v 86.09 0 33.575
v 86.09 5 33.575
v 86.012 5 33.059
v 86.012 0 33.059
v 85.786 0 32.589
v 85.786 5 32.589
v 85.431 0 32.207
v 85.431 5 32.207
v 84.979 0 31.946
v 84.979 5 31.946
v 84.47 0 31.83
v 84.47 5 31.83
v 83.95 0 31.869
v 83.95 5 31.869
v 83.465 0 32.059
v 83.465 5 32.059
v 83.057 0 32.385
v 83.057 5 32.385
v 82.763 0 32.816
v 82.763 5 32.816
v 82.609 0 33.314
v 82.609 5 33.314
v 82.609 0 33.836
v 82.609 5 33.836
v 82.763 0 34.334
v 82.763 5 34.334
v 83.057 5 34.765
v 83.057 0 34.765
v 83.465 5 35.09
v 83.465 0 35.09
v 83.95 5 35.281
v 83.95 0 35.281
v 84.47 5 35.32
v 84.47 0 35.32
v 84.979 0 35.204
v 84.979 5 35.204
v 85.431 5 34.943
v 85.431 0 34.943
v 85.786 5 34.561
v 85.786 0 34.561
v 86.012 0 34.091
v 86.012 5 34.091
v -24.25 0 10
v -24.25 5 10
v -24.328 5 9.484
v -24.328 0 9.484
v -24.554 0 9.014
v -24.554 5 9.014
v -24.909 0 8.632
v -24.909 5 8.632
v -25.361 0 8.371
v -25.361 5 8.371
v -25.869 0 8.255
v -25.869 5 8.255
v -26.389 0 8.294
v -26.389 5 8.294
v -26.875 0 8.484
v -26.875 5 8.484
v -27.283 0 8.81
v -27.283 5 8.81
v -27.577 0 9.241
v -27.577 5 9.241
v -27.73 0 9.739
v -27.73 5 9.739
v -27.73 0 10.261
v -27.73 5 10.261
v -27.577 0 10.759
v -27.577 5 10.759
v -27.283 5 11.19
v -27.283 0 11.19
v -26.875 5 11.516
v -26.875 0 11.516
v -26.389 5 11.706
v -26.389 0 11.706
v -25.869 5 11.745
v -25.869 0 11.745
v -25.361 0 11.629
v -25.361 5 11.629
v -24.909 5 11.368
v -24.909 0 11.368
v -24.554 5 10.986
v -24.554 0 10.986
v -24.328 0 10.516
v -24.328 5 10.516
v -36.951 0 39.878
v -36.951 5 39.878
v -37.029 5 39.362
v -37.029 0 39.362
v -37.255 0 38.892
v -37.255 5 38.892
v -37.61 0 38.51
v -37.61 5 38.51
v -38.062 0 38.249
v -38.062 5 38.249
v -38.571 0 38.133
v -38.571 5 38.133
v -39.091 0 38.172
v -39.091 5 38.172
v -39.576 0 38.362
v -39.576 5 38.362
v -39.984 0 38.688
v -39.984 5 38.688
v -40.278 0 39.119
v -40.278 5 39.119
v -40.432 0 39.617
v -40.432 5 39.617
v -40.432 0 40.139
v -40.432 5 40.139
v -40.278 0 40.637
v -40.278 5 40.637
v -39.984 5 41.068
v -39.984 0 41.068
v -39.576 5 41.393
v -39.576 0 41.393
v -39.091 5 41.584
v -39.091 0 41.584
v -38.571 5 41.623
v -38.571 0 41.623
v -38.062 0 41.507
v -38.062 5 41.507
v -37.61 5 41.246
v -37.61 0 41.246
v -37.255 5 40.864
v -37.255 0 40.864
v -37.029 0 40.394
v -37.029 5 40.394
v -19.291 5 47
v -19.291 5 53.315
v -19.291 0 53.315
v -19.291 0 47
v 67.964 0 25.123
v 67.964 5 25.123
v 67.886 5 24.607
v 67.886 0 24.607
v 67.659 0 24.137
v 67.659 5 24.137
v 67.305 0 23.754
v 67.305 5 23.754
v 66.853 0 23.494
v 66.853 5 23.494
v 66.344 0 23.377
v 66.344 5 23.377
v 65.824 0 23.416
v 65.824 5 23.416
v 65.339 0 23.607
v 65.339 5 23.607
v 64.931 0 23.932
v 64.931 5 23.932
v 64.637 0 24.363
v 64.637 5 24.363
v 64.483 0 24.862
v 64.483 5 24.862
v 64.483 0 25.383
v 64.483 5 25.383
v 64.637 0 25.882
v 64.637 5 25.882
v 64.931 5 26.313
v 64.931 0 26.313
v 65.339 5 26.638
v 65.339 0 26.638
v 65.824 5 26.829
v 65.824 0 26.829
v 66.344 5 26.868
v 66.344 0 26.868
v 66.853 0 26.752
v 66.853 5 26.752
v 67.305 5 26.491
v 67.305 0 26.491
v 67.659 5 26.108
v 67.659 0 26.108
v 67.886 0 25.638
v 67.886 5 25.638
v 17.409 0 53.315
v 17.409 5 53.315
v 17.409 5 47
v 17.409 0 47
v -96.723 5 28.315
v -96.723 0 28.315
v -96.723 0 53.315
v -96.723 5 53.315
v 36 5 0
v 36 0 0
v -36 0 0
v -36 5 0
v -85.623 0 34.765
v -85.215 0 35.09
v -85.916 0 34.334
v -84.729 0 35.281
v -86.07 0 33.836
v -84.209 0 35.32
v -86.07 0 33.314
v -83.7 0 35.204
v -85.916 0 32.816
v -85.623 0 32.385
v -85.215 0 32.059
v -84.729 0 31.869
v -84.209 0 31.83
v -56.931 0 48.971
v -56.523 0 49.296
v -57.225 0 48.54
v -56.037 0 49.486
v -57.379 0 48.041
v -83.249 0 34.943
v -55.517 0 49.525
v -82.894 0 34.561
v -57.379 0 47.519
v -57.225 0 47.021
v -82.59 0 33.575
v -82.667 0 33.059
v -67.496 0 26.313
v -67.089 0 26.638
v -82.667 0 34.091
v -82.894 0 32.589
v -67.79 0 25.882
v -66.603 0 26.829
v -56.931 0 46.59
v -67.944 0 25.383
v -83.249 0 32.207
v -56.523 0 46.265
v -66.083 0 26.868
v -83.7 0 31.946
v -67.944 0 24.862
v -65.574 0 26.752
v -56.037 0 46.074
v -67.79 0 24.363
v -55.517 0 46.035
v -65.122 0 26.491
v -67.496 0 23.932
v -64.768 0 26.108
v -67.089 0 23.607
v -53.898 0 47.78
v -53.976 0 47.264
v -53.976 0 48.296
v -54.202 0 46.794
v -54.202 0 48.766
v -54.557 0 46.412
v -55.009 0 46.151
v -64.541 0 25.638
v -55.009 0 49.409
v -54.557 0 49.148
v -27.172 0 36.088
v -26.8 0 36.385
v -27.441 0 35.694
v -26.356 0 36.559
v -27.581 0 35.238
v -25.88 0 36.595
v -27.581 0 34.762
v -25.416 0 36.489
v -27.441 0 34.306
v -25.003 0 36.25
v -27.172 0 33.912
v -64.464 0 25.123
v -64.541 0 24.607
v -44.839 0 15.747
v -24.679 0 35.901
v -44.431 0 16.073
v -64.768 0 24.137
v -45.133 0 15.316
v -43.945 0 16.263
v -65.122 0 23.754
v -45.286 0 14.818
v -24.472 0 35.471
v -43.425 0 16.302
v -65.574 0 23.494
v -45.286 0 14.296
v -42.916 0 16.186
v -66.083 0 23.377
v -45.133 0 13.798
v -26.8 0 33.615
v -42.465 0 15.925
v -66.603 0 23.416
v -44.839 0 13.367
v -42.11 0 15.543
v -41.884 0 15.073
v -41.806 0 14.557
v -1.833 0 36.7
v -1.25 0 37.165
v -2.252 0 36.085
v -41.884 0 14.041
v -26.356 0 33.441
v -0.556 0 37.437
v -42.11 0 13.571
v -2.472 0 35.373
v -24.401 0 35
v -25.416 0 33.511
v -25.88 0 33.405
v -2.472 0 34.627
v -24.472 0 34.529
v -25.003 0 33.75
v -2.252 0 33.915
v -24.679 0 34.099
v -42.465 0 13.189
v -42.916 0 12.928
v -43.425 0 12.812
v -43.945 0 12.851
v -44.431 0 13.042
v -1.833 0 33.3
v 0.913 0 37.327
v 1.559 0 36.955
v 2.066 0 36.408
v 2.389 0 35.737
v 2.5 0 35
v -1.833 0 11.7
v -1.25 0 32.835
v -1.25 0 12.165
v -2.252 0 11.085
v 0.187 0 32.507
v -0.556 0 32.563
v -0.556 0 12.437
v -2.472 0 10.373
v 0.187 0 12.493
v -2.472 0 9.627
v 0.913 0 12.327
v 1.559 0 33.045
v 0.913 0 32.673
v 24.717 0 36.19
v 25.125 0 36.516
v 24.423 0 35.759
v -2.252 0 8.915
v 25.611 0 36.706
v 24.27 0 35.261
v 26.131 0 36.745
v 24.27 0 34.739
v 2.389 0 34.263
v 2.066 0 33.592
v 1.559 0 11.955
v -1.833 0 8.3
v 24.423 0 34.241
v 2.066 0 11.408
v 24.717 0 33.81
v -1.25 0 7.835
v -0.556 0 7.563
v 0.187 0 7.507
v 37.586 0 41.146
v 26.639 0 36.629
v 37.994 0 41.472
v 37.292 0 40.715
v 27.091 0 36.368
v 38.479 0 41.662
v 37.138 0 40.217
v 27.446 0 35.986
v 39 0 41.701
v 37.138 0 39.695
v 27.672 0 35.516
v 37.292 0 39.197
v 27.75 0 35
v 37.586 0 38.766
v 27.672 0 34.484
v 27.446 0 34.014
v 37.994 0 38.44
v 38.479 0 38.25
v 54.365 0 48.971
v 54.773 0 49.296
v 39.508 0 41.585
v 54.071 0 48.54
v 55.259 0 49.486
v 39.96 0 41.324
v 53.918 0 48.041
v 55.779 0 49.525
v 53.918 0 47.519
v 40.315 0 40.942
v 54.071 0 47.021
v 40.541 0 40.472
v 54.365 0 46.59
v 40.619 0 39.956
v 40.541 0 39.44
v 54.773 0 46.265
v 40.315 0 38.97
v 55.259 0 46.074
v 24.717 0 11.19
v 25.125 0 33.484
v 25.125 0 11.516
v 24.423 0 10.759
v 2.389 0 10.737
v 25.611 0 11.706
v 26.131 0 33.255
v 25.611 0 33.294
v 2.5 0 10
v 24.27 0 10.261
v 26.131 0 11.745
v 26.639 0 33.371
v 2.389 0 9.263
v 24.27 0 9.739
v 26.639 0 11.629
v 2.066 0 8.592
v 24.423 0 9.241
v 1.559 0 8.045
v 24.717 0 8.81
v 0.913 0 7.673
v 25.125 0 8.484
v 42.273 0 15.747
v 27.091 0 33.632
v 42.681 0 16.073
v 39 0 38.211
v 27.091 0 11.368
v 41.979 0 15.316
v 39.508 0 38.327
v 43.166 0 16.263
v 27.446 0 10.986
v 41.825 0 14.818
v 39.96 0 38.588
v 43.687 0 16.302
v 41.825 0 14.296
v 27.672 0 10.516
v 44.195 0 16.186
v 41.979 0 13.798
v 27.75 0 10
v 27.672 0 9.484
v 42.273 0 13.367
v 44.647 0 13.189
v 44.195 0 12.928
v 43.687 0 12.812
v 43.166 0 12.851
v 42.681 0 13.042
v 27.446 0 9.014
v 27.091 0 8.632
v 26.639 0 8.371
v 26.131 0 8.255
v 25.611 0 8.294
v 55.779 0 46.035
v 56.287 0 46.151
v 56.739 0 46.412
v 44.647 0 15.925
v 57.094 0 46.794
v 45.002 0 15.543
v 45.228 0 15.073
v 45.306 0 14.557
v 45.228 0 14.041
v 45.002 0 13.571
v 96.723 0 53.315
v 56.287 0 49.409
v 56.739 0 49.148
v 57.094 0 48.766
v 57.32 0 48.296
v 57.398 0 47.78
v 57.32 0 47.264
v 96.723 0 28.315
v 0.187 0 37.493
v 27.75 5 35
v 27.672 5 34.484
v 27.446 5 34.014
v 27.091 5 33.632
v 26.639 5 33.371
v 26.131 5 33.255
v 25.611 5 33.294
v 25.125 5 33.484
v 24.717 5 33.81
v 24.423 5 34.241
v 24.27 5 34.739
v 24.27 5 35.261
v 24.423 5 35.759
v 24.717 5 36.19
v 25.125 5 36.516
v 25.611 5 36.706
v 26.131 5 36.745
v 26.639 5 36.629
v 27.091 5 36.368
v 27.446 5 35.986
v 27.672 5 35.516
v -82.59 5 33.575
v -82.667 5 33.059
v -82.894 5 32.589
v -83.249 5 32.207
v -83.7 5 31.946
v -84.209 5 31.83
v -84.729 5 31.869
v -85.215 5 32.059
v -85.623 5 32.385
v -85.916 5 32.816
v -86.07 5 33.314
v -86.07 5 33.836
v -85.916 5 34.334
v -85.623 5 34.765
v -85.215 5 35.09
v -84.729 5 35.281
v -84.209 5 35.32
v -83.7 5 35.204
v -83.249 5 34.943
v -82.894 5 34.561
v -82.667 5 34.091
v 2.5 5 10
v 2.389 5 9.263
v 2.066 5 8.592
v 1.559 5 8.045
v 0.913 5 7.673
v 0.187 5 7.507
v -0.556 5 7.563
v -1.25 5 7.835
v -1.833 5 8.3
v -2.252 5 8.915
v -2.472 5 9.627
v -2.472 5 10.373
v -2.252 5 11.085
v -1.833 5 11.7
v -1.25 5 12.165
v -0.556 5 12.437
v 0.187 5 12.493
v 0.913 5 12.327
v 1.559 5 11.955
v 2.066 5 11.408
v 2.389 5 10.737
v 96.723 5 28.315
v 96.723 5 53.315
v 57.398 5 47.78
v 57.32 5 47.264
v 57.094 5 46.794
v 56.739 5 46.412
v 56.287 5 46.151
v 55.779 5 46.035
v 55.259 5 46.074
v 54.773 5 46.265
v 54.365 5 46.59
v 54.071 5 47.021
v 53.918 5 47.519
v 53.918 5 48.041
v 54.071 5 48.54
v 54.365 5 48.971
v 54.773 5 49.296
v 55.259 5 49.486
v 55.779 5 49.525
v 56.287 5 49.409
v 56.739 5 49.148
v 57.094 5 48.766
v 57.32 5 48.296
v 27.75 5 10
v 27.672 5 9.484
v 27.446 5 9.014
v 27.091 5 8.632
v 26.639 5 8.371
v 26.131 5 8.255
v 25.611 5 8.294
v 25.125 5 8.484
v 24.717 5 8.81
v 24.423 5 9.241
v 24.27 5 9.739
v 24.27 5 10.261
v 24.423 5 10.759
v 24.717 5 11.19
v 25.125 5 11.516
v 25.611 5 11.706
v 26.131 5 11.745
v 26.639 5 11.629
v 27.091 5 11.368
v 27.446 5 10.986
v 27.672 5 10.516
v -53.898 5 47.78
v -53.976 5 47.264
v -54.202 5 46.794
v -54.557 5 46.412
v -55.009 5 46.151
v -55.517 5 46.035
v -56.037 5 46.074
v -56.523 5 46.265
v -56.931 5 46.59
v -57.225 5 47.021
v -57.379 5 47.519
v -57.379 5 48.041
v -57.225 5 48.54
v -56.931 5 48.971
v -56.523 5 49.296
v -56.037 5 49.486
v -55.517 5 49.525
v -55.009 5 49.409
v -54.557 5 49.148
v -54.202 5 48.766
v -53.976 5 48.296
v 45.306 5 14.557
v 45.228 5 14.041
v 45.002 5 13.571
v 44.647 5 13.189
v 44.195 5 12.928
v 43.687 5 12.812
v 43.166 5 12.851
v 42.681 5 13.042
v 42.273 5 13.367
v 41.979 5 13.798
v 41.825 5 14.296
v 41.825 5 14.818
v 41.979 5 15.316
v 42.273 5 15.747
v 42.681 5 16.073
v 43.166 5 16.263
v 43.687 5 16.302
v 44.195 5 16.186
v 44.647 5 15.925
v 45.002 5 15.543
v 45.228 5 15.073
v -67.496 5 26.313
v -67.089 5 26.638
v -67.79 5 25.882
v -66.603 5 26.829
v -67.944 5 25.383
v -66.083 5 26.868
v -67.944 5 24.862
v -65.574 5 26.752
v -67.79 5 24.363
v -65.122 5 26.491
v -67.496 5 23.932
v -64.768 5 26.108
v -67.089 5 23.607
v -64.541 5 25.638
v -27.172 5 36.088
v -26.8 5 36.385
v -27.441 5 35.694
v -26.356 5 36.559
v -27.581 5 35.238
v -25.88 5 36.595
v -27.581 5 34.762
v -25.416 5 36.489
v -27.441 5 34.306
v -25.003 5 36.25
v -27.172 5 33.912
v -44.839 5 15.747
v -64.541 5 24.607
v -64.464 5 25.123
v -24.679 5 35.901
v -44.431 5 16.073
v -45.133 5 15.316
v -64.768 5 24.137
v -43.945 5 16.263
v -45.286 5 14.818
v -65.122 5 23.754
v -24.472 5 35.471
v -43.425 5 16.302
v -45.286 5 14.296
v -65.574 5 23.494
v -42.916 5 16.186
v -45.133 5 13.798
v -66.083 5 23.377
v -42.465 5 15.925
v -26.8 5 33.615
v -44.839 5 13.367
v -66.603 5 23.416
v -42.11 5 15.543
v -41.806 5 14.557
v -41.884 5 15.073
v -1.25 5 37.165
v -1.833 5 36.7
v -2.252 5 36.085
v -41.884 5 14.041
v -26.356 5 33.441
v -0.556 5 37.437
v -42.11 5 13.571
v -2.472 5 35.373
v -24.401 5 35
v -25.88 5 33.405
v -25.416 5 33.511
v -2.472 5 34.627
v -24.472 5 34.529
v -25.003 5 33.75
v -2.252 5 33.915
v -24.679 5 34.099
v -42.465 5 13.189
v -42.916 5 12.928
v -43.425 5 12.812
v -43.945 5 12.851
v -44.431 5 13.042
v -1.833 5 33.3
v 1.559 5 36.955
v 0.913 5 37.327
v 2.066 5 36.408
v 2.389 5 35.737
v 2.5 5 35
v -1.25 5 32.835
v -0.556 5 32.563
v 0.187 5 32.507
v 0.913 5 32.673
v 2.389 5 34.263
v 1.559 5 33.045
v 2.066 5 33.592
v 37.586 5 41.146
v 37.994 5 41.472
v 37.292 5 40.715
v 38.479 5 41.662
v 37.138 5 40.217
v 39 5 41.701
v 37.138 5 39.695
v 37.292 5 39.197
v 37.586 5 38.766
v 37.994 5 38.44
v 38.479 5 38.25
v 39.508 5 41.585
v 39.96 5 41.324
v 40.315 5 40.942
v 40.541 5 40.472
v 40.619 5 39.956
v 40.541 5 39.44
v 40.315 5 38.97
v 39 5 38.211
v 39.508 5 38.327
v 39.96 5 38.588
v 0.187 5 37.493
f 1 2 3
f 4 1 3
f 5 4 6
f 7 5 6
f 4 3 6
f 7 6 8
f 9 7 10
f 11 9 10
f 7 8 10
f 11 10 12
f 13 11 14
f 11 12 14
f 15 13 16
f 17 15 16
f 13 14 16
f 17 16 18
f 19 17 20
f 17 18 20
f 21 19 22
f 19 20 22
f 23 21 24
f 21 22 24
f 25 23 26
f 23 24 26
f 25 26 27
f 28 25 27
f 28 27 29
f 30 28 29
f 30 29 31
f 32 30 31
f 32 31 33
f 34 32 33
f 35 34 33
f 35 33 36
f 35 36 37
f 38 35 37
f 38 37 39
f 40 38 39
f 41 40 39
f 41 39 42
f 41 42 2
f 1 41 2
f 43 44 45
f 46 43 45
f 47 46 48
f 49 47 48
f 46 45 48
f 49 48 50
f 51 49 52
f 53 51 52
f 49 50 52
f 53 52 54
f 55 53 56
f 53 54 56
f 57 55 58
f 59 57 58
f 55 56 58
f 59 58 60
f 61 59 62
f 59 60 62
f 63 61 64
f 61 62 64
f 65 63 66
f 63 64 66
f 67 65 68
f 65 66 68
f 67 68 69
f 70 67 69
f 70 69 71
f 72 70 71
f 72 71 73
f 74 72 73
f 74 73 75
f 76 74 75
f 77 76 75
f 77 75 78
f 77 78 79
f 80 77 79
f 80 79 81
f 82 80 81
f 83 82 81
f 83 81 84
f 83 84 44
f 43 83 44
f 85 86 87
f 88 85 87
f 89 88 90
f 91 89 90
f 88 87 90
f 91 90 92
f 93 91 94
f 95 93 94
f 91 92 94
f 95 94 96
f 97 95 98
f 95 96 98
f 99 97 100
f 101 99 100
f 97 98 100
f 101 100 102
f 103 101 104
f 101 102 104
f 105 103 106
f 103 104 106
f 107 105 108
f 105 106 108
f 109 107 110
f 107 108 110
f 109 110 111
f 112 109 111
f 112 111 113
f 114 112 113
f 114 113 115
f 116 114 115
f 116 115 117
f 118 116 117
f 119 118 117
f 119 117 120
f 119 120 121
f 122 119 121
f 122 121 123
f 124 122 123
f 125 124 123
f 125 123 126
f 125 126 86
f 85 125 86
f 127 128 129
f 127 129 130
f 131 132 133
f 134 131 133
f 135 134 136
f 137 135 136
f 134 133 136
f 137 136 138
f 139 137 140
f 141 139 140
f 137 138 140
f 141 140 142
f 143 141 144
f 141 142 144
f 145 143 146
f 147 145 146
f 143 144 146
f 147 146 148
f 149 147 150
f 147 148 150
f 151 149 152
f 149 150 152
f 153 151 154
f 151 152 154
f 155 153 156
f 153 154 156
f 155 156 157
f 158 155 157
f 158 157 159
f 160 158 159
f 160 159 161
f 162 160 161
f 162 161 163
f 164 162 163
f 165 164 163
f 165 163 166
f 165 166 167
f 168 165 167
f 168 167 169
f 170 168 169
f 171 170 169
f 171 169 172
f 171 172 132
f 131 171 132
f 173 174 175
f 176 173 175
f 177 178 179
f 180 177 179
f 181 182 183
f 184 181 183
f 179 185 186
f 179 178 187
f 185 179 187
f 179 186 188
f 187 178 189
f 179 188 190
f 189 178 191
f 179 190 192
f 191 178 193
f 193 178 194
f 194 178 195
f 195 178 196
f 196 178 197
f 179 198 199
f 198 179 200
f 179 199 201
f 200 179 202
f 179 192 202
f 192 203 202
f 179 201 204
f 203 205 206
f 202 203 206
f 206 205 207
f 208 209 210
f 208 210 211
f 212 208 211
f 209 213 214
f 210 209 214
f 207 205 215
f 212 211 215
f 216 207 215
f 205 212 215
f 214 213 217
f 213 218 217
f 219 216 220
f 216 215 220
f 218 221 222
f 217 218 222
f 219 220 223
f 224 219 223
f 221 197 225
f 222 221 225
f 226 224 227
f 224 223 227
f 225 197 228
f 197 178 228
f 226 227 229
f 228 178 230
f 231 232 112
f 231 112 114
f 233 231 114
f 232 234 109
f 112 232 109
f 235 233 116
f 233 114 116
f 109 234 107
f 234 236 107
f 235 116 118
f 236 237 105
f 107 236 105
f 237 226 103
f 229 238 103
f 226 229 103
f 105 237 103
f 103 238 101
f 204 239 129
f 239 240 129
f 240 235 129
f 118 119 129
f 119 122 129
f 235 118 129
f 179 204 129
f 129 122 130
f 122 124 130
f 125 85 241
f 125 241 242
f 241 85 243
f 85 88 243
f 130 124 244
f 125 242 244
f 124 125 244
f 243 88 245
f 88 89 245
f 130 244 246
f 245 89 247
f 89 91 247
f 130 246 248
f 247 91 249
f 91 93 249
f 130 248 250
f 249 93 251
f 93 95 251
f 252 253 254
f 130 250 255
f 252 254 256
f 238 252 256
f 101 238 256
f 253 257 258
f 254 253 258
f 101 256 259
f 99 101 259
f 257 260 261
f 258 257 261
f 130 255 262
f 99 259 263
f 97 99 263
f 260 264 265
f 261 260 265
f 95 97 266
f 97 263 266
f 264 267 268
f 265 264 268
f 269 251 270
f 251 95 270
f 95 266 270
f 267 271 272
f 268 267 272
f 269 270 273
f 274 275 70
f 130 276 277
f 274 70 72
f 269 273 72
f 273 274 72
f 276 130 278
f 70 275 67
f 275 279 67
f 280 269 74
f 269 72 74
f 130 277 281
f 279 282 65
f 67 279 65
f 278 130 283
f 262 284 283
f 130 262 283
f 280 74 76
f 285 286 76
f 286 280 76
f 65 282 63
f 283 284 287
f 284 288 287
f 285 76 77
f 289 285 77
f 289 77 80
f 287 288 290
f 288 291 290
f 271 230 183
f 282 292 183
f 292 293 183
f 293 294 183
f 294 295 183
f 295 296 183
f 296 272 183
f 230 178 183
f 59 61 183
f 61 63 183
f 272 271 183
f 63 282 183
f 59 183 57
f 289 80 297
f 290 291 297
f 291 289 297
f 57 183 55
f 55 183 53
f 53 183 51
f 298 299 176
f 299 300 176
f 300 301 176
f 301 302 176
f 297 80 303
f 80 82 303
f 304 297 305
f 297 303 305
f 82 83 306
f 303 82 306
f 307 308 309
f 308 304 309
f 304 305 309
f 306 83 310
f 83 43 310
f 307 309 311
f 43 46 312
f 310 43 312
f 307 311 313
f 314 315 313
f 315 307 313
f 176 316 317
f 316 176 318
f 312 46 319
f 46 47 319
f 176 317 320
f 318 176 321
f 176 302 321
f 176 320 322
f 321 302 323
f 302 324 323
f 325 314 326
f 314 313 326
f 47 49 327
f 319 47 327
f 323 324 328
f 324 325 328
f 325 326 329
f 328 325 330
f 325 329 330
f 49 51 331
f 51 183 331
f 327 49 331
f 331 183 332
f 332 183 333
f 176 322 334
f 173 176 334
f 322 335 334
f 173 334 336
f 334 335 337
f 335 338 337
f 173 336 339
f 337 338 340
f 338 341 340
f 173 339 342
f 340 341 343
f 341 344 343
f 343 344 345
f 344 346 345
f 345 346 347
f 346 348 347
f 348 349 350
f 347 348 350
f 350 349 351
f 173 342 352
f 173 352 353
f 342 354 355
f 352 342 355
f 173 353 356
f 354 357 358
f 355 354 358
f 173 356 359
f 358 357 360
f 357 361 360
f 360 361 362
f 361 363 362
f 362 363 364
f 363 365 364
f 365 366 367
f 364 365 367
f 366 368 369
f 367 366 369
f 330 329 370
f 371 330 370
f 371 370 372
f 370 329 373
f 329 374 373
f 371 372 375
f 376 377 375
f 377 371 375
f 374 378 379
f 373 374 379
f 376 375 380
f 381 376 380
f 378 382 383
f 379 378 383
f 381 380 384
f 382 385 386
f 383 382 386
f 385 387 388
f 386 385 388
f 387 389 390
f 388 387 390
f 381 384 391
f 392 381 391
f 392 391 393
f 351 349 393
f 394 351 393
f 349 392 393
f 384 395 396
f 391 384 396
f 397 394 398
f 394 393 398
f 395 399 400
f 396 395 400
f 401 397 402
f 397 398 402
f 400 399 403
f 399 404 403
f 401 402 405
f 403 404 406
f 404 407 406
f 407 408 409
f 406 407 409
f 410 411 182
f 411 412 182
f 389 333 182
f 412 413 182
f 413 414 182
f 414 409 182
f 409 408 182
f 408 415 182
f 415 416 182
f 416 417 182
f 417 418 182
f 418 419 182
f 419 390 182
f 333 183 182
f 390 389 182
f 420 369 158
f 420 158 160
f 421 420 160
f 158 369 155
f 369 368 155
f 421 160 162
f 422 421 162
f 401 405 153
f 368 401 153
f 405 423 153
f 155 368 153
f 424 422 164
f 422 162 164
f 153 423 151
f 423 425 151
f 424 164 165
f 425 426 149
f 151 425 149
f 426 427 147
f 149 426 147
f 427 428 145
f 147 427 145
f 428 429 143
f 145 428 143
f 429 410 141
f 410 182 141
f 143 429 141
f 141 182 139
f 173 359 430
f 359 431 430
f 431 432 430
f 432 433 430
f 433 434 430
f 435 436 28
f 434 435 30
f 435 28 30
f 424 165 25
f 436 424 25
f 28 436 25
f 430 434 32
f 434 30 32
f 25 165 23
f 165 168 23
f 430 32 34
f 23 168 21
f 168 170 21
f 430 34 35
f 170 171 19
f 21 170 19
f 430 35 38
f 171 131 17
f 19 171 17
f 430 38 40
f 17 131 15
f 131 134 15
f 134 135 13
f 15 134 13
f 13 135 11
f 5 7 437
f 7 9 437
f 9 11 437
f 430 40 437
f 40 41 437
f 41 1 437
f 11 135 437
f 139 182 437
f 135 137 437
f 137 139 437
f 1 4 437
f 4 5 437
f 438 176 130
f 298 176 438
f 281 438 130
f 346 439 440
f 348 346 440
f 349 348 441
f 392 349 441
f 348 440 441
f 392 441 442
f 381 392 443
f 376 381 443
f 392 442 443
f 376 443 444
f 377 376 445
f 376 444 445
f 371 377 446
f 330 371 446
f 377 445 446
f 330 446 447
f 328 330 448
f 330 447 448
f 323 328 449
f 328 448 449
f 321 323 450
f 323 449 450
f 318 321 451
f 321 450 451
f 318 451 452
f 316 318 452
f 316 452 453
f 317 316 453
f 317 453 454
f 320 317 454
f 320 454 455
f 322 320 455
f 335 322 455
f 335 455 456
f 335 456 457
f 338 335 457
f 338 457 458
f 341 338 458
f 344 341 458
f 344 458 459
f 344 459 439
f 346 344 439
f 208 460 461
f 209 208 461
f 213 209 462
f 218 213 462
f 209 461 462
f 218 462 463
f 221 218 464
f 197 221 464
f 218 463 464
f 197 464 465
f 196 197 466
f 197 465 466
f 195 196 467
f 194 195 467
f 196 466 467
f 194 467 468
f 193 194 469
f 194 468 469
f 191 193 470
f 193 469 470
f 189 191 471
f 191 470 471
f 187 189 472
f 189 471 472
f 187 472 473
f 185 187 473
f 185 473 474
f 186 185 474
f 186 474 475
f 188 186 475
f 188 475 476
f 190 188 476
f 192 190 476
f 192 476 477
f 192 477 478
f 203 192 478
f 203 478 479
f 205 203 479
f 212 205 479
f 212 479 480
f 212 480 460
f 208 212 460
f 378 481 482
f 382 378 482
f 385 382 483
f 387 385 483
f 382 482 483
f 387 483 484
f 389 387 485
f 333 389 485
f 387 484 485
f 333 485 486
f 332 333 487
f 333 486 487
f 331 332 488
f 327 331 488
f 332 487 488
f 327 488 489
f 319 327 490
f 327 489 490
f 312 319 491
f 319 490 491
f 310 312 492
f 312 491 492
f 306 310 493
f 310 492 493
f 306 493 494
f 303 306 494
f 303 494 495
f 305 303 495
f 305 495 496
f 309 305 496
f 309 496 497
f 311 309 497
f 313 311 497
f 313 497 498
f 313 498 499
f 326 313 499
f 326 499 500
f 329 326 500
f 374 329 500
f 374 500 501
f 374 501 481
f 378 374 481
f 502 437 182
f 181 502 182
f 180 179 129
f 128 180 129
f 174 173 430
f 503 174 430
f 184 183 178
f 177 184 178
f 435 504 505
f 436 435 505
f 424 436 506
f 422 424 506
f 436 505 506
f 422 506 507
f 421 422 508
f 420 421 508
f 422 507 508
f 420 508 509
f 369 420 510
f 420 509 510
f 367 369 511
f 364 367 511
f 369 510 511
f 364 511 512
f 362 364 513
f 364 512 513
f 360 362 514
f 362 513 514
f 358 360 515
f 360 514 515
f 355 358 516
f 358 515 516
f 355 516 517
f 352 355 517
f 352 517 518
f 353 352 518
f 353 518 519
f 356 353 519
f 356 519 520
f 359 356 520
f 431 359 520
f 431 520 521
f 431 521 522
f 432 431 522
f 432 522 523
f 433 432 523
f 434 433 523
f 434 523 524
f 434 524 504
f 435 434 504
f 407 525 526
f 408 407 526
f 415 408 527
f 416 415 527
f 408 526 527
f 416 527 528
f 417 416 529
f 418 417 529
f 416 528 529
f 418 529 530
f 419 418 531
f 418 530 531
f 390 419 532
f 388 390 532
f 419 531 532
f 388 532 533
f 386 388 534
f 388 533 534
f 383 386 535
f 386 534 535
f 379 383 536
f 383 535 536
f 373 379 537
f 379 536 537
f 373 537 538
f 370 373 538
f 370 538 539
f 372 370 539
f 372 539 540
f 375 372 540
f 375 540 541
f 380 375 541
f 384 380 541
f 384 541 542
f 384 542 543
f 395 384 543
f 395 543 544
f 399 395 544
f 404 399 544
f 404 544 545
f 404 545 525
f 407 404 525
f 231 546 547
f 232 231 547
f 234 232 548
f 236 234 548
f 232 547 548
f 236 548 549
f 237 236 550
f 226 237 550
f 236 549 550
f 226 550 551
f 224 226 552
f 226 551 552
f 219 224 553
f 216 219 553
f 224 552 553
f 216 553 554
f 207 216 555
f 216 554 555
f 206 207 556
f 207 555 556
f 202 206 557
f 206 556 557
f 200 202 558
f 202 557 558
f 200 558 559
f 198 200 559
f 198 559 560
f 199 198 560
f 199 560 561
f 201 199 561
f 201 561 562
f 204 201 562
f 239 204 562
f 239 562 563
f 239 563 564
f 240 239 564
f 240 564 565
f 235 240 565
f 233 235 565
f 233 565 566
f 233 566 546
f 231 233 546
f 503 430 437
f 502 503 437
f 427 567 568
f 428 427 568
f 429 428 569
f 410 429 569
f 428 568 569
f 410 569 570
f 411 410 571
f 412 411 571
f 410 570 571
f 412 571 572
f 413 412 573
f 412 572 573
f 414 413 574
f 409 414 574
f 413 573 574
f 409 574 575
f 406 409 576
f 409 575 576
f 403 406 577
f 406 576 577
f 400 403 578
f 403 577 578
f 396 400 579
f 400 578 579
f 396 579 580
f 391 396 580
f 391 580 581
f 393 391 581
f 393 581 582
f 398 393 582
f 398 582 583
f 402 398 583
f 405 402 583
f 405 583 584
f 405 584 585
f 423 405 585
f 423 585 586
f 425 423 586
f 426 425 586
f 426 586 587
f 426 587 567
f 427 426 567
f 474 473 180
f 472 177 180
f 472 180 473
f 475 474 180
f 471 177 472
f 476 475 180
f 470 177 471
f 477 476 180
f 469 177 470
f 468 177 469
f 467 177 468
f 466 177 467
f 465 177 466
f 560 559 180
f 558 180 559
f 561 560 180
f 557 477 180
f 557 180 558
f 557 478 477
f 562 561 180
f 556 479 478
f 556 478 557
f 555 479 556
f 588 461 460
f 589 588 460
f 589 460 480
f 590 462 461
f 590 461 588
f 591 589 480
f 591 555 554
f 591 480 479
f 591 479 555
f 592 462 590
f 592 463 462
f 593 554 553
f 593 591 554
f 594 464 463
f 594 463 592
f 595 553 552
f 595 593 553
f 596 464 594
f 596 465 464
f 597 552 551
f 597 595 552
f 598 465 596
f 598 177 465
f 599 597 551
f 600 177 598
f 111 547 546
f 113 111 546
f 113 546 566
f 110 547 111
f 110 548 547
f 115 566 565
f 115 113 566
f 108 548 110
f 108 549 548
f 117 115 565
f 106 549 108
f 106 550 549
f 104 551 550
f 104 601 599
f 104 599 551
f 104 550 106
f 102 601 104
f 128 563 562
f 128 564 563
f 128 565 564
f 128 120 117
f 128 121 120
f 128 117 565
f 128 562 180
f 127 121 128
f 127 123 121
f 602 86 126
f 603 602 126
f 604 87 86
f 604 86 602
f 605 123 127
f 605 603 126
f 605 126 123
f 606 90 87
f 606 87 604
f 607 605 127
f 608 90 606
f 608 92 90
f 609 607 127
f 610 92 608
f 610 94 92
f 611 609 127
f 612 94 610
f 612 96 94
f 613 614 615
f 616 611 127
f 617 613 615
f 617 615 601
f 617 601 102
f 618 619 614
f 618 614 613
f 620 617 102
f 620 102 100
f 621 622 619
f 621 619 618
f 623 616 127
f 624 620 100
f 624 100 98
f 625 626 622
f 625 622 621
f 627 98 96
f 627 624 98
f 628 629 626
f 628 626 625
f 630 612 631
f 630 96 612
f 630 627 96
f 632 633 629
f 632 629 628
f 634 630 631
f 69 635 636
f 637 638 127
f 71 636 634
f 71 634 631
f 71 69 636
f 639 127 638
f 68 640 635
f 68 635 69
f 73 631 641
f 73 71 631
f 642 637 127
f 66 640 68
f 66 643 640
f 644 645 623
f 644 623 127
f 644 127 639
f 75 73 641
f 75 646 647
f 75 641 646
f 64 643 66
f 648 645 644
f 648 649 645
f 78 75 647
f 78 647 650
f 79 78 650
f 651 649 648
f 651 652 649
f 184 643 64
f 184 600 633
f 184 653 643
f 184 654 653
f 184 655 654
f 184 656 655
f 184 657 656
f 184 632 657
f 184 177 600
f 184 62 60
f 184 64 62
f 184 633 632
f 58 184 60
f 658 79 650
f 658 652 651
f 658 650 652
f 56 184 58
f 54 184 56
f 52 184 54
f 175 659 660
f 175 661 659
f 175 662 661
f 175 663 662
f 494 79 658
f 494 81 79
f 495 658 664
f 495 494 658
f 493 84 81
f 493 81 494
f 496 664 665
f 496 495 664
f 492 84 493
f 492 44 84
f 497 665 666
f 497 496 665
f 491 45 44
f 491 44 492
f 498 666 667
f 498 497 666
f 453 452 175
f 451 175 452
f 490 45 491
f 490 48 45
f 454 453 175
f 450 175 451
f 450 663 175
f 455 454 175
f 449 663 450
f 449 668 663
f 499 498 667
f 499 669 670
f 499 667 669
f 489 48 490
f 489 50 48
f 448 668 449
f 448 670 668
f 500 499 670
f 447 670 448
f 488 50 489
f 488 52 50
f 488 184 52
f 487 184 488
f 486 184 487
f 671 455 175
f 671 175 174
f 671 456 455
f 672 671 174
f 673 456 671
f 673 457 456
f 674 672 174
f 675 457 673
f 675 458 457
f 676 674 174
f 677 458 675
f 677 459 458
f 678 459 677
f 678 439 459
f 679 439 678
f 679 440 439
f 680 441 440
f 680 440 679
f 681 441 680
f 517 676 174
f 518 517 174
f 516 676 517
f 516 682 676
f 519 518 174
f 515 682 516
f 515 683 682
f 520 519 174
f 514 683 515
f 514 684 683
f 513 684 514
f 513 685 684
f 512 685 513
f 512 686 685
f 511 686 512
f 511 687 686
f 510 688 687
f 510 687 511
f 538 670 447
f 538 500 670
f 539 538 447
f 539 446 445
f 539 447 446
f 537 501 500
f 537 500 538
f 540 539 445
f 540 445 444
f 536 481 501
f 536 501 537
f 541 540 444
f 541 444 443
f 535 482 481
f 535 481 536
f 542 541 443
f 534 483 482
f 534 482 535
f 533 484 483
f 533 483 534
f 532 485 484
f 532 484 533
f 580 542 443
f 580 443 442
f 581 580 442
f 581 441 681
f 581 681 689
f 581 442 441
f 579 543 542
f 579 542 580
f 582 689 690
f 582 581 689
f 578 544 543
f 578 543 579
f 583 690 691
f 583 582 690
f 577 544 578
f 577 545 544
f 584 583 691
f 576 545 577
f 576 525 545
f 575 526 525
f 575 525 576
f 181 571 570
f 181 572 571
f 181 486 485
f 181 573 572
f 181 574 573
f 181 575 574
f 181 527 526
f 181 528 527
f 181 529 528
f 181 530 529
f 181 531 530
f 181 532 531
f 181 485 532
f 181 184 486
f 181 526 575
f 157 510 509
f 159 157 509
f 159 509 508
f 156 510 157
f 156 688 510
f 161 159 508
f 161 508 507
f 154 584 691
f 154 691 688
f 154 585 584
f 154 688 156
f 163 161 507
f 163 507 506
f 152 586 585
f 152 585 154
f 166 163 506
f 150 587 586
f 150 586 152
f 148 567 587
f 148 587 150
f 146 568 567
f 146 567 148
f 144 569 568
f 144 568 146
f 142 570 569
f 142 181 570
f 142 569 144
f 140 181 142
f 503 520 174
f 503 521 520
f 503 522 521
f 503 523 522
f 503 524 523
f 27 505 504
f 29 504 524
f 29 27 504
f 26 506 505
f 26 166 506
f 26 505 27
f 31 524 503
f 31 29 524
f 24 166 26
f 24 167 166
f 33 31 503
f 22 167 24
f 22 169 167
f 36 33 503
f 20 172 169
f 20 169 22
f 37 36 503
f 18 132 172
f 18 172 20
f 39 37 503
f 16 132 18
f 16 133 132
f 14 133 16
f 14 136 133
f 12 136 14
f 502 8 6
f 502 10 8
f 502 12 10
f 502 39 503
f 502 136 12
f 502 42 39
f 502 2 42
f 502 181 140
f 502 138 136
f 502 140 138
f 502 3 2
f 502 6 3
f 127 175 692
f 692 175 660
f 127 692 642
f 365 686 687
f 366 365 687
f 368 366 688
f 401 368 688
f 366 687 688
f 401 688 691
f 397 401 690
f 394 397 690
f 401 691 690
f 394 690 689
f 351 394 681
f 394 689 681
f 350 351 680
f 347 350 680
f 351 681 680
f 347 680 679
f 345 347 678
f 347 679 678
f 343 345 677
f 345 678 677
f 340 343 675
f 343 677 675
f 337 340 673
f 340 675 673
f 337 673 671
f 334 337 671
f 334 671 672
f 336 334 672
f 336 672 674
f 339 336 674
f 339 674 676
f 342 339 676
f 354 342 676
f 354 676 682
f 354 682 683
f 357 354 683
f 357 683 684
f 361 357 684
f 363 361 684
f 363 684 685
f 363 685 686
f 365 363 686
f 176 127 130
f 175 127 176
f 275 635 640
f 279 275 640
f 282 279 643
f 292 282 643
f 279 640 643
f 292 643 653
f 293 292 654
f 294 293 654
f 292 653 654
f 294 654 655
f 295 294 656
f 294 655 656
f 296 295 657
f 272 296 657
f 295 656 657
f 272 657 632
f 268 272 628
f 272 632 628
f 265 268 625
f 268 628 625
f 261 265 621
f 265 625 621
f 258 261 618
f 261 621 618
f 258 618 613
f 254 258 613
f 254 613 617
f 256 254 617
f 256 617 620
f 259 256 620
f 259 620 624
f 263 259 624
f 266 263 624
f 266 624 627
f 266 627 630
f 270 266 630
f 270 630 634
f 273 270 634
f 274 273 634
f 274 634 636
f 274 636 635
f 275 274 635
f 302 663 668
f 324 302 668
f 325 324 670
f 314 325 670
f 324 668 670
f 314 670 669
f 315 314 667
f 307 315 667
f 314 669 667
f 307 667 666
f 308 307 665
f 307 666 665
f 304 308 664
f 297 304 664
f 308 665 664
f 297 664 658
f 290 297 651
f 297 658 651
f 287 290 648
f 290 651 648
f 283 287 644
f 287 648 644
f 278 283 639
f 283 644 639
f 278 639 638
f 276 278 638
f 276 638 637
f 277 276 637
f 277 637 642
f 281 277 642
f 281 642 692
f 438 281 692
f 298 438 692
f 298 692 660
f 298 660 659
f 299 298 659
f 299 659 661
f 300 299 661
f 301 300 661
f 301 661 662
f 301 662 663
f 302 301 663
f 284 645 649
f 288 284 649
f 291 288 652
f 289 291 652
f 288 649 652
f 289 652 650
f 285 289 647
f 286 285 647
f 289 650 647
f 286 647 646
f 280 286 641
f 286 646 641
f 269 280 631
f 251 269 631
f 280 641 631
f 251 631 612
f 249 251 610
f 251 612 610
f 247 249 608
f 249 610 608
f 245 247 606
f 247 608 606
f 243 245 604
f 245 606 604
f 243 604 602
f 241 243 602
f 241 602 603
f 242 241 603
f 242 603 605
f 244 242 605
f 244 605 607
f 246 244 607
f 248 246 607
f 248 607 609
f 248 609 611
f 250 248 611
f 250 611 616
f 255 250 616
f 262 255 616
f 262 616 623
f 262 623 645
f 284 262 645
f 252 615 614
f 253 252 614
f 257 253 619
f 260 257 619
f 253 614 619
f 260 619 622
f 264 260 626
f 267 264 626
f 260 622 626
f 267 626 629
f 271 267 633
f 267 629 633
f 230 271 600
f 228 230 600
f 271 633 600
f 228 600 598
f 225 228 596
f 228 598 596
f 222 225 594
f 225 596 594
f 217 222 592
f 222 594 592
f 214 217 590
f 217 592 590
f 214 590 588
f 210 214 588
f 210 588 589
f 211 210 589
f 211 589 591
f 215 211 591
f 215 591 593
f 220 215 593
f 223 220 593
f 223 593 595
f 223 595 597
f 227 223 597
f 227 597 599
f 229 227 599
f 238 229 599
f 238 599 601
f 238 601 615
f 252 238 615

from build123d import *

# Parameters (mm, degrees)
SALIENTE_EXTRUIR1_DEPTH = 5
CORTAR_EXTRUIR1_REACH   = 7
CROQUIS2_R              = 1.75
CROQUIS2_R_2            = 2.5
CROQUIS2_R_3            = 1.599246839
CROQUIS3_W              = 36.7
CROQUIS3_H              = 6.315423537
CORTAR_EXTRUIR2_DEPTH   = 10


with BuildPart() as part:
    # Croquis1 → Saliente-Extruir1 (new body)
    with BuildSketch(Plane(origin=(0, 0, 0), x_dir=(1, 0, 0), z_dir=(0, 1, 0))):
        Polygon((36, 0), (-36, 0), (-96.722621731, -28.315423537), (-96.722621731, -53.315423537), (96.722621731, -53.315423537), (96.722621731, -28.315423537), align=None)
    extrude(amount=SALIENTE_EXTRUIR1_DEPTH)

    # Croquis2 → Cortar-Extruir1 (cut, up to next)
    with BuildSketch(Plane(origin=(0, 5, 0), x_dir=(1, 0, 0), z_dir=(0, 1, 0)), mode=Mode.PRIVATE) as cortar_extruir1_sk1:
        with Locations((-84.339669031, -33.574937051)):
            Circle(CROQUIS2_R)
    cortar_extruir1_tool1 = extrude(cortar_extruir1_sk1.sketch, amount=-CORTAR_EXTRUIR1_REACH, mode=Mode.PRIVATE) & part.part
    add(cortar_extruir1_tool1.solids().sort_by_distance((-84.339669, 5, 33.574937))[0], mode=Mode.SUBTRACT)
    # Croquis2 → Cortar-Extruir1 (cut, up to next)
    with BuildSketch(Plane(origin=(0, 5, 0), x_dir=(1, 0, 0), z_dir=(0, 1, 0)), mode=Mode.PRIVATE) as cortar_extruir1_sk2:
        with Locations((-66.21351329, -25.122571817)):
            Circle(CROQUIS2_R)
    cortar_extruir1_tool2 = extrude(cortar_extruir1_sk2.sketch, amount=-CORTAR_EXTRUIR1_REACH, mode=Mode.PRIVATE) & part.part
    add(cortar_extruir1_tool2.solids().sort_by_distance((-66.213513, 5, 25.122572))[0], mode=Mode.SUBTRACT)
    # Croquis2 → Cortar-Extruir1 (cut, up to next)
    with BuildSketch(Plane(origin=(0, 5, 0), x_dir=(1, 0, 0), z_dir=(0, 1, 0)), mode=Mode.PRIVATE) as cortar_extruir1_sk3:
        with Locations((-55.648056746, -47.780266492)):
            Circle(CROQUIS2_R)
    cortar_extruir1_tool3 = extrude(cortar_extruir1_sk3.sketch, amount=-CORTAR_EXTRUIR1_REACH, mode=Mode.PRIVATE) & part.part
    add(cortar_extruir1_tool3.solids().sort_by_distance((-55.648057, 5, 47.780266))[0], mode=Mode.SUBTRACT)
    # Croquis2 → Cortar-Extruir1 (cut, up to next)
    with BuildSketch(Plane(origin=(0, 5, 0), x_dir=(1, 0, 0), z_dir=(0, 1, 0)), mode=Mode.PRIVATE) as cortar_extruir1_sk4:
        with Locations((-38.701346441, -39.877885696)):
            Circle(CROQUIS2_R)
    cortar_extruir1_tool4 = extrude(cortar_extruir1_sk4.sketch, amount=-CORTAR_EXTRUIR1_REACH, mode=Mode.PRIVATE) & part.part
    add(cortar_extruir1_tool4.solids().sort_by_distance((-38.701346, 5, 39.877886))[0], mode=Mode.SUBTRACT)
    # Croquis2 → Cortar-Extruir1 (cut, up to next)
    with BuildSketch(Plane(origin=(0, 5, 0), x_dir=(1, 0, 0), z_dir=(0, 1, 0)), mode=Mode.PRIVATE) as cortar_extruir1_sk5:
        with Locations((-43.555818614, -14.557115273)):
            Circle(CROQUIS2_R)
    cortar_extruir1_tool5 = extrude(cortar_extruir1_sk5.sketch, amount=-CORTAR_EXTRUIR1_REACH, mode=Mode.PRIVATE) & part.part
    add(cortar_extruir1_tool5.solids().sort_by_distance((-43.555819, 5, 14.557115))[0], mode=Mode.SUBTRACT)
    # Croquis2 → Cortar-Extruir1 (cut, up to next)
    with BuildSketch(Plane(origin=(0, 5, 0), x_dir=(1, 0, 0), z_dir=(0, 1, 0)), mode=Mode.PRIVATE) as cortar_extruir1_sk6:
        with Locations((38.868873457, -39.956004827)):
            Circle(CROQUIS2_R)
    cortar_extruir1_tool6 = extrude(cortar_extruir1_sk6.sketch, amount=-CORTAR_EXTRUIR1_REACH, mode=Mode.PRIVATE) & part.part
    add(cortar_extruir1_tool6.solids().sort_by_distance((38.868873, 5, 39.956005))[0], mode=Mode.SUBTRACT)
    # Croquis2 → Cortar-Extruir1 (cut, up to next)
    with BuildSketch(Plane(origin=(0, 5, 0), x_dir=(1, 0, 0), z_dir=(0, 1, 0)), mode=Mode.PRIVATE) as cortar_extruir1_sk7:
        with Locations((55.648056746, -47.780266492)):
            Circle(CROQUIS2_R)
    cortar_extruir1_tool7 = extrude(cortar_extruir1_sk7.sketch, amount=-CORTAR_EXTRUIR1_REACH, mode=Mode.PRIVATE) & part.part
    add(cortar_extruir1_tool7.solids().sort_by_distance((55.648057, 5, 47.780266))[0], mode=Mode.SUBTRACT)
    # Croquis2 → Cortar-Extruir1 (cut, up to next)
    with BuildSketch(Plane(origin=(0, 5, 0), x_dir=(1, 0, 0), z_dir=(0, 1, 0)), mode=Mode.PRIVATE) as cortar_extruir1_sk8:
        with Locations((84.339669031, -33.574937051)):
            Circle(CROQUIS2_R)
    cortar_extruir1_tool8 = extrude(cortar_extruir1_sk8.sketch, amount=-CORTAR_EXTRUIR1_REACH, mode=Mode.PRIVATE) & part.part
    add(cortar_extruir1_tool8.solids().sort_by_distance((84.339669, 5, 33.574937))[0], mode=Mode.SUBTRACT)
    # Croquis2 → Cortar-Extruir1 (cut, up to next)
    with BuildSketch(Plane(origin=(0, 5, 0), x_dir=(1, 0, 0), z_dir=(0, 1, 0)), mode=Mode.PRIVATE) as cortar_extruir1_sk9:
        with Locations((66.21351329, -25.122571817)):
            Circle(CROQUIS2_R)
    cortar_extruir1_tool9 = extrude(cortar_extruir1_sk9.sketch, amount=-CORTAR_EXTRUIR1_REACH, mode=Mode.PRIVATE) & part.part
    add(cortar_extruir1_tool9.solids().sort_by_distance((66.213513, 5, 25.122572))[0], mode=Mode.SUBTRACT)
    # Croquis2 → Cortar-Extruir1 (cut, up to next)
    with BuildSketch(Plane(origin=(0, 5, 0), x_dir=(1, 0, 0), z_dir=(0, 1, 0)), mode=Mode.PRIVATE) as cortar_extruir1_sk10:
        with Locations((43.555818614, -14.557115273)):
            Circle(CROQUIS2_R)
    cortar_extruir1_tool10 = extrude(cortar_extruir1_sk10.sketch, amount=-CORTAR_EXTRUIR1_REACH, mode=Mode.PRIVATE) & part.part
    add(cortar_extruir1_tool10.solids().sort_by_distance((43.555819, 5, 14.557115))[0], mode=Mode.SUBTRACT)
    # Croquis2 → Cortar-Extruir1 (cut, up to next)
    with BuildSketch(Plane(origin=(0, 5, 0), x_dir=(1, 0, 0), z_dir=(0, 1, 0)), mode=Mode.PRIVATE) as cortar_extruir1_sk11:
        with Locations((0, -10)):
            Circle(CROQUIS2_R_2)
    cortar_extruir1_tool11 = extrude(cortar_extruir1_sk11.sketch, amount=-CORTAR_EXTRUIR1_REACH, mode=Mode.PRIVATE) & part.part
    add(cortar_extruir1_tool11.solids().sort_by_distance((0, 5, 10))[0], mode=Mode.SUBTRACT)
    # Croquis2 → Cortar-Extruir1 (cut, up to next)
    with BuildSketch(Plane(origin=(0, 5, 0), x_dir=(1, 0, 0), z_dir=(0, 1, 0)), mode=Mode.PRIVATE) as cortar_extruir1_sk12:
        with Locations((0, -35)):
            Circle(CROQUIS2_R_2)
    cortar_extruir1_tool12 = extrude(cortar_extruir1_sk12.sketch, amount=-CORTAR_EXTRUIR1_REACH, mode=Mode.PRIVATE) & part.part
    add(cortar_extruir1_tool12.solids().sort_by_distance((0, 5, 35))[0], mode=Mode.SUBTRACT)
    # Croquis2 → Cortar-Extruir1 (cut, up to next)
    with BuildSketch(Plane(origin=(0, 5, 0), x_dir=(1, 0, 0), z_dir=(0, 1, 0)), mode=Mode.PRIVATE) as cortar_extruir1_sk13:
        with Locations((26, -10)):
            Circle(CROQUIS2_R)
    cortar_extruir1_tool13 = extrude(cortar_extruir1_sk13.sketch, amount=-CORTAR_EXTRUIR1_REACH, mode=Mode.PRIVATE) & part.part
    add(cortar_extruir1_tool13.solids().sort_by_distance((26, 5, 10))[0], mode=Mode.SUBTRACT)
    # Croquis2 → Cortar-Extruir1 (cut, up to next)
    with BuildSketch(Plane(origin=(0, 5, 0), x_dir=(1, 0, 0), z_dir=(0, 1, 0)), mode=Mode.PRIVATE) as cortar_extruir1_sk14:
        with Locations((26, -35)):
            Circle(CROQUIS2_R)
    cortar_extruir1_tool14 = extrude(cortar_extruir1_sk14.sketch, amount=-CORTAR_EXTRUIR1_REACH, mode=Mode.PRIVATE) & part.part
    add(cortar_extruir1_tool14.solids().sort_by_distance((26, 5, 35))[0], mode=Mode.SUBTRACT)
    # Croquis2 → Cortar-Extruir1 (cut, up to next)
    with BuildSketch(Plane(origin=(0, 5, 0), x_dir=(1, 0, 0), z_dir=(0, 1, 0)), mode=Mode.PRIVATE) as cortar_extruir1_sk15:
        with Locations((-26, -10)):
            Circle(CROQUIS2_R)
    cortar_extruir1_tool15 = extrude(cortar_extruir1_sk15.sketch, amount=-CORTAR_EXTRUIR1_REACH, mode=Mode.PRIVATE) & part.part
    add(cortar_extruir1_tool15.solids().sort_by_distance((-26, 5, 10))[0], mode=Mode.SUBTRACT)
    # Croquis2 → Cortar-Extruir1 (cut, up to next)
    with BuildSketch(Plane(origin=(0, 5, 0), x_dir=(1, 0, 0), z_dir=(0, 1, 0)), mode=Mode.PRIVATE) as cortar_extruir1_sk16:
        with Locations((-26, -35)):
            Circle(CROQUIS2_R_3)
    cortar_extruir1_tool16 = extrude(cortar_extruir1_sk16.sketch, amount=-CORTAR_EXTRUIR1_REACH, mode=Mode.PRIVATE) & part.part
    add(cortar_extruir1_tool16.solids().sort_by_distance((-26, 5, 35))[0], mode=Mode.SUBTRACT)

    # Croquis3 → Cortar-Extruir2 (cut)
    with BuildSketch(Plane(origin=(0, 5, 0), x_dir=(1, 0, 0), z_dir=(0, 1, 0))):
        with Locations((-0.941024734, -50.157711769)):
            Rectangle(CROQUIS3_W, CROQUIS3_H)
    extrude(amount=-CORTAR_EXTRUIR2_DEPTH, mode=Mode.SUBTRACT)


solid = part.part
